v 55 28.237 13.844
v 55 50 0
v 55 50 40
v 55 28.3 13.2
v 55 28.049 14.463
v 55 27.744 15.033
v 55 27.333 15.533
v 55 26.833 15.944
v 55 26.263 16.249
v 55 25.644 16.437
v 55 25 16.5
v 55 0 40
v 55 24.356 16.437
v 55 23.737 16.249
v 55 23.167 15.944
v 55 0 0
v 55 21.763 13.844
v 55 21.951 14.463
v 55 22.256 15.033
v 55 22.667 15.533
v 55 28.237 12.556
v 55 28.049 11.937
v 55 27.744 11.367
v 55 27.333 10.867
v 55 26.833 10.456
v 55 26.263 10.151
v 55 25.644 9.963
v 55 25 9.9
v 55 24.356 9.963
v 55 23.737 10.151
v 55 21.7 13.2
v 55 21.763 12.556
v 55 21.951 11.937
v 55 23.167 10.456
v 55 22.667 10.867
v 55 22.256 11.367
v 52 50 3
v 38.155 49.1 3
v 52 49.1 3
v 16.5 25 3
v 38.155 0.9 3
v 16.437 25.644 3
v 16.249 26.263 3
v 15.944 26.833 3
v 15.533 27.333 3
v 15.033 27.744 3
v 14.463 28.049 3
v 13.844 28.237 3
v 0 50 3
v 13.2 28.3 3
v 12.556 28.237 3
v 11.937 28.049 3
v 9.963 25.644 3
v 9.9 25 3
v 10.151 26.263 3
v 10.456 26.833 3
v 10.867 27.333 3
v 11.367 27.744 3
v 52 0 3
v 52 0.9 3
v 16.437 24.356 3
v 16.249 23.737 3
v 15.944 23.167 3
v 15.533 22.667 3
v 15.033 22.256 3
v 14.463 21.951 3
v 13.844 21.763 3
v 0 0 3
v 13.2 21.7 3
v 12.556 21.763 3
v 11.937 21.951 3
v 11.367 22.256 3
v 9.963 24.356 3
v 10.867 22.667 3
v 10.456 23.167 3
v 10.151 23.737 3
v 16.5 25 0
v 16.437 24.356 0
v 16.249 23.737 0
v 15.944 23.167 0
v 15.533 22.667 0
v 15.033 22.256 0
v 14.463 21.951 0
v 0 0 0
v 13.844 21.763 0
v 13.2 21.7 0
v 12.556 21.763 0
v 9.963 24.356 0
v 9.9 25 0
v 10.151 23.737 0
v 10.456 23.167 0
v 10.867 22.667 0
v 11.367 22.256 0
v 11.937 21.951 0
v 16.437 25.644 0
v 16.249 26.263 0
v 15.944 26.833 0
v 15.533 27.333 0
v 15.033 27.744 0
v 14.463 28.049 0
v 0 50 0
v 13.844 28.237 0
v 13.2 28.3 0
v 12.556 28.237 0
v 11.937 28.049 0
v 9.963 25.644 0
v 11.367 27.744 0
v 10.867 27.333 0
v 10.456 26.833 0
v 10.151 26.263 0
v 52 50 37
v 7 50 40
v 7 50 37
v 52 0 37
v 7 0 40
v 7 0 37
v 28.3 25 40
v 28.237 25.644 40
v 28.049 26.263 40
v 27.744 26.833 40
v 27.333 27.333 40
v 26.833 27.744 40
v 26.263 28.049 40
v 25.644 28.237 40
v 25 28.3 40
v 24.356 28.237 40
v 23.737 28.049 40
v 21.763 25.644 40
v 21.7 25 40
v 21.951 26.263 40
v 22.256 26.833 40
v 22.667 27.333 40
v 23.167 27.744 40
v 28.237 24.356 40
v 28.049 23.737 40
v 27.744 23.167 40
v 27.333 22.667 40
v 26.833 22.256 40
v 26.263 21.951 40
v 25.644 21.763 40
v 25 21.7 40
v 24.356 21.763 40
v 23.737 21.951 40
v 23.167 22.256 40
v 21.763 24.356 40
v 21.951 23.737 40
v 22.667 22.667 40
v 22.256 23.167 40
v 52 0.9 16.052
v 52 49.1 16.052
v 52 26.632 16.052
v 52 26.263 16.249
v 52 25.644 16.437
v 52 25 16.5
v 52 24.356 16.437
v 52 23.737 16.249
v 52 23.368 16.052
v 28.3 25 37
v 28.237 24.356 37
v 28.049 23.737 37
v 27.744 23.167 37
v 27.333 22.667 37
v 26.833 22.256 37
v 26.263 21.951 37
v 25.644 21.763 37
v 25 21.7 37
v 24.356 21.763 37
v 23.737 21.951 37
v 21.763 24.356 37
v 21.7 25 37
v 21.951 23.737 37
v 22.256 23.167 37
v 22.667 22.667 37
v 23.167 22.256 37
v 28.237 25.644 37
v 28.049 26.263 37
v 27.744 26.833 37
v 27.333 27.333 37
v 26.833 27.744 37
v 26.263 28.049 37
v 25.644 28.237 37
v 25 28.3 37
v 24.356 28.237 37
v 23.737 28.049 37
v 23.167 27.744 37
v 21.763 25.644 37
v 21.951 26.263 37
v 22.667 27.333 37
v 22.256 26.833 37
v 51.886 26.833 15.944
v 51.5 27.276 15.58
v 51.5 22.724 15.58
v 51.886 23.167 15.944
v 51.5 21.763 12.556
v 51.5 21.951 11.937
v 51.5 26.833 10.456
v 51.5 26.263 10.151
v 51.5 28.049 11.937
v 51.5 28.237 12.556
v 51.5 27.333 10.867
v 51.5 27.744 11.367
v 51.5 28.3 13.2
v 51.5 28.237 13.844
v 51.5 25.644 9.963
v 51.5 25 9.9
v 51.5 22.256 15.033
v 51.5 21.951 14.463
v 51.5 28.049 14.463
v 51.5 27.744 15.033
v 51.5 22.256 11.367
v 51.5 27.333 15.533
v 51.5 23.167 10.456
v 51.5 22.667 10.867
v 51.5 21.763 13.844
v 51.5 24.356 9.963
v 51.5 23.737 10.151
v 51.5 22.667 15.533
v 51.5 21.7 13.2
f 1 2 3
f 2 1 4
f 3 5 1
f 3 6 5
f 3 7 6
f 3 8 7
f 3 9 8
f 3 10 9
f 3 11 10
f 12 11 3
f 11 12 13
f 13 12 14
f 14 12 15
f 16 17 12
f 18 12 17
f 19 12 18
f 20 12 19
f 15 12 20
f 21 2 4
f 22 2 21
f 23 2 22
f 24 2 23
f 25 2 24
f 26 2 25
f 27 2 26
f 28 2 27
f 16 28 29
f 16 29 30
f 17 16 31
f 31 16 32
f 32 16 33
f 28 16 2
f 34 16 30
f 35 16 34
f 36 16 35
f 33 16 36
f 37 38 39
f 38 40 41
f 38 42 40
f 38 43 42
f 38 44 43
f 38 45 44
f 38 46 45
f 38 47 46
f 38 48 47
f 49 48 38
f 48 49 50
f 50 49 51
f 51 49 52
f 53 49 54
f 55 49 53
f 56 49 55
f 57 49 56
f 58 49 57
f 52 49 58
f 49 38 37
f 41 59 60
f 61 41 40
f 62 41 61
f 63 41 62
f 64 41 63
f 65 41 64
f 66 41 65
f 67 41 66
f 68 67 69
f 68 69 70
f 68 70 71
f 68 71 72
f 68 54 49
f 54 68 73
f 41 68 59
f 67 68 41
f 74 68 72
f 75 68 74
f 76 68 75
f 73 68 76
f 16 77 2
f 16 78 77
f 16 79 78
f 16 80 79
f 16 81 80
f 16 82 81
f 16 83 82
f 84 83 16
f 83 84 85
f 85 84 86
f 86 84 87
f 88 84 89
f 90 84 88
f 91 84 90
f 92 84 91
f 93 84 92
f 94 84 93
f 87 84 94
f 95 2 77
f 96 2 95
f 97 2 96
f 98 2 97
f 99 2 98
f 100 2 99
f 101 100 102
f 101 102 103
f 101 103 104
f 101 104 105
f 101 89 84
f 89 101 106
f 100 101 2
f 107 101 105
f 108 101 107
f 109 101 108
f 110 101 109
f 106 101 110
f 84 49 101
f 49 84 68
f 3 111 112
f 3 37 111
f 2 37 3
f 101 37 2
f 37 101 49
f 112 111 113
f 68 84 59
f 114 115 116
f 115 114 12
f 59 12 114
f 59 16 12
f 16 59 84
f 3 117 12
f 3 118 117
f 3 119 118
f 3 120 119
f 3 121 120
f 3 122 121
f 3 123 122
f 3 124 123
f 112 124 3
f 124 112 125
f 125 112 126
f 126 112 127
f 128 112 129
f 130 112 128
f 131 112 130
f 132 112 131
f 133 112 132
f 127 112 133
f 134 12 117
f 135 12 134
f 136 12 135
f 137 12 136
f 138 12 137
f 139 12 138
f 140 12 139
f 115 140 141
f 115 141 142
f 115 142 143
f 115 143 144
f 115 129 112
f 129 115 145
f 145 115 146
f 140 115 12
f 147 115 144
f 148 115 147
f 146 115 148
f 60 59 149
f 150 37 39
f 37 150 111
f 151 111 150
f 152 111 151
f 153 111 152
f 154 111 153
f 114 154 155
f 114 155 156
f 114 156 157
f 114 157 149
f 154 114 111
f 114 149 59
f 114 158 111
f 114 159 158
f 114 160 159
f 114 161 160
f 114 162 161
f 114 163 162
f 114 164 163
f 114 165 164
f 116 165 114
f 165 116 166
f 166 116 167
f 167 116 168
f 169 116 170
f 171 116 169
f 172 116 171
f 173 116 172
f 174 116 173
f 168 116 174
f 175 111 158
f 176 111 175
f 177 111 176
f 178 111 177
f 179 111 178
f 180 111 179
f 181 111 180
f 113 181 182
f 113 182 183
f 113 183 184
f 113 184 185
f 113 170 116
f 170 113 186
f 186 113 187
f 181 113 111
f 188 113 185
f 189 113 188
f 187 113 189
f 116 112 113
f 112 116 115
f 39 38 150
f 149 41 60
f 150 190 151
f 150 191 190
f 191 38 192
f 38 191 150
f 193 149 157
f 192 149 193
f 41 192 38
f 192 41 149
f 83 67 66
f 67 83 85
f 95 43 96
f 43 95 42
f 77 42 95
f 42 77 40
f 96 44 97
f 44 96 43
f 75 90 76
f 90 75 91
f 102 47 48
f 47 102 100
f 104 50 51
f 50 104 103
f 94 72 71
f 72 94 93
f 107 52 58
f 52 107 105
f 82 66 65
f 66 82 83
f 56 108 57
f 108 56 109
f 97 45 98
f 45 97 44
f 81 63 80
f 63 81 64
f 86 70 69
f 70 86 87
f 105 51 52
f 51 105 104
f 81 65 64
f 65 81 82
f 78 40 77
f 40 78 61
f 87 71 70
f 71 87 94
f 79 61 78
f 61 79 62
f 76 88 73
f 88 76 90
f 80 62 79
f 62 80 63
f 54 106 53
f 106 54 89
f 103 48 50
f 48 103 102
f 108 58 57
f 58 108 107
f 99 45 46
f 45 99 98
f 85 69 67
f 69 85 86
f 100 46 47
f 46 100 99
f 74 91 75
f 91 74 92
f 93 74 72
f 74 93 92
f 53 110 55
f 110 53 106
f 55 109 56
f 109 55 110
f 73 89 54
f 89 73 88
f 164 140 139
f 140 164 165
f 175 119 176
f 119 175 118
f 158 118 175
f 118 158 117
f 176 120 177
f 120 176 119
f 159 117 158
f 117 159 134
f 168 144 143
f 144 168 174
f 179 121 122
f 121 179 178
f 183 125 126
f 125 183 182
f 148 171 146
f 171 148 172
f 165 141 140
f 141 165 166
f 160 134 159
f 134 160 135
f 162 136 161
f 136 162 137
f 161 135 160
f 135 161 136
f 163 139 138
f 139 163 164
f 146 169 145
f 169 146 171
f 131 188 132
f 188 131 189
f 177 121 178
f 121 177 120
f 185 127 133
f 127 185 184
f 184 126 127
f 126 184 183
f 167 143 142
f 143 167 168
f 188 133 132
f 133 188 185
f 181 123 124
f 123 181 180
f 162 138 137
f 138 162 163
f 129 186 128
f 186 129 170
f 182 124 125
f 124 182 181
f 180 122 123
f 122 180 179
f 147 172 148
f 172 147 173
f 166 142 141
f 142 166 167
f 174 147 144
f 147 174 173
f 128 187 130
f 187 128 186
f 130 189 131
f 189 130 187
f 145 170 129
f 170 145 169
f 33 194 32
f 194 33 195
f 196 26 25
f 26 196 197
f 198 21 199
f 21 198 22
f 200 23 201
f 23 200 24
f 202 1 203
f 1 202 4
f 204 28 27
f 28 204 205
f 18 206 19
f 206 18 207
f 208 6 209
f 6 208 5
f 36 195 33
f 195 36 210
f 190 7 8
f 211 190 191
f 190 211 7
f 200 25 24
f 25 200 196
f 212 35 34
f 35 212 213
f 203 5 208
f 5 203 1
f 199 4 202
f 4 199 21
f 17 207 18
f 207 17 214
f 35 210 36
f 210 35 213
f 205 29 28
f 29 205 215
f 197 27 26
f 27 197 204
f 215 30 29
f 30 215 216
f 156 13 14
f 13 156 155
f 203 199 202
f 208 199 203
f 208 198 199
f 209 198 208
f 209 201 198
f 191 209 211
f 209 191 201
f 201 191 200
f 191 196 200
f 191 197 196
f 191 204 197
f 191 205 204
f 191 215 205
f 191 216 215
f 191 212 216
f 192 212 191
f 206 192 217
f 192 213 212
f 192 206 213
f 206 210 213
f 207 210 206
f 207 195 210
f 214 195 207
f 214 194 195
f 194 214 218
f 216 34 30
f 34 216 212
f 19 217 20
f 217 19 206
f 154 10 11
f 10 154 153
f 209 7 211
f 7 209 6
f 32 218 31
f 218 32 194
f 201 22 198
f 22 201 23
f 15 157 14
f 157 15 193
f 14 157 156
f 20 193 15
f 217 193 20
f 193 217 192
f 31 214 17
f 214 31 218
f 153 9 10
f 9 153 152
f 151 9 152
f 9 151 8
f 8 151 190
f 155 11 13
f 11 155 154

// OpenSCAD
$fn = 32;

// ----------------------------------------------------------------------
// Z-bracket: 55 x 50 x 40 mm
// ----------------------------------------------------------------------

// --- parameters (mm) ---
lower_leg = 55;           // lower foot length, X
upper_leg = 45;           // upper foot length, X
bracket_w = 50;           // bracket width, Y
offset_h = 40;            // overall rise, Z
sheet_t = 3;              // plate thickness
hole_d = 6.6;             // clearance for M6
rib_len = 14.8;           // gusset leg
rib_sink = 0.9;           // gusset overlap into the plates

module hole_z(px, py, z0) {
  translate([px, py, z0 - 0.5]) cylinder(h = sheet_t + 1, d = hole_d);
}
module hole_x(py, pz) {
  translate([-0.5, py, pz]) rotate([0, 90, 0]) cylinder(h = sheet_t + 1, d = hole_d);
}
module gusset(x0) {
  translate([x0, bracket_w - rib_sink, 0])
    rotate([90, 0, 0])
      linear_extrude(height = bracket_w - 2 * rib_sink)
        polygon(points = [[rib_sink, sheet_t - rib_sink],
                          [rib_sink, sheet_t - rib_sink + rib_len],
                          [-rib_len, sheet_t - rib_sink]]);
}

difference() {
  union() {
    cube([lower_leg, bracket_w, sheet_t]);
    /* web, overlapping the lower foot */
    translate([lower_leg - sheet_t, 0, 0]) cube([sheet_t, bracket_w, offset_h]);
    /* upper foot, sunk into the web */
    translate([lower_leg - sheet_t - upper_leg, 0, offset_h - sheet_t]) cube([upper_leg + sheet_t, bracket_w, sheet_t]);
    gusset(lower_leg - sheet_t);
  }
  hole_z(13.2, 25, 0);
  translate([lower_leg - sheet_t - 27, 0, 0]) hole_z(0, 25, offset_h - sheet_t);
  translate([lower_leg - sheet_t, 0, 0]) hole_x(25, 13.2);
}
